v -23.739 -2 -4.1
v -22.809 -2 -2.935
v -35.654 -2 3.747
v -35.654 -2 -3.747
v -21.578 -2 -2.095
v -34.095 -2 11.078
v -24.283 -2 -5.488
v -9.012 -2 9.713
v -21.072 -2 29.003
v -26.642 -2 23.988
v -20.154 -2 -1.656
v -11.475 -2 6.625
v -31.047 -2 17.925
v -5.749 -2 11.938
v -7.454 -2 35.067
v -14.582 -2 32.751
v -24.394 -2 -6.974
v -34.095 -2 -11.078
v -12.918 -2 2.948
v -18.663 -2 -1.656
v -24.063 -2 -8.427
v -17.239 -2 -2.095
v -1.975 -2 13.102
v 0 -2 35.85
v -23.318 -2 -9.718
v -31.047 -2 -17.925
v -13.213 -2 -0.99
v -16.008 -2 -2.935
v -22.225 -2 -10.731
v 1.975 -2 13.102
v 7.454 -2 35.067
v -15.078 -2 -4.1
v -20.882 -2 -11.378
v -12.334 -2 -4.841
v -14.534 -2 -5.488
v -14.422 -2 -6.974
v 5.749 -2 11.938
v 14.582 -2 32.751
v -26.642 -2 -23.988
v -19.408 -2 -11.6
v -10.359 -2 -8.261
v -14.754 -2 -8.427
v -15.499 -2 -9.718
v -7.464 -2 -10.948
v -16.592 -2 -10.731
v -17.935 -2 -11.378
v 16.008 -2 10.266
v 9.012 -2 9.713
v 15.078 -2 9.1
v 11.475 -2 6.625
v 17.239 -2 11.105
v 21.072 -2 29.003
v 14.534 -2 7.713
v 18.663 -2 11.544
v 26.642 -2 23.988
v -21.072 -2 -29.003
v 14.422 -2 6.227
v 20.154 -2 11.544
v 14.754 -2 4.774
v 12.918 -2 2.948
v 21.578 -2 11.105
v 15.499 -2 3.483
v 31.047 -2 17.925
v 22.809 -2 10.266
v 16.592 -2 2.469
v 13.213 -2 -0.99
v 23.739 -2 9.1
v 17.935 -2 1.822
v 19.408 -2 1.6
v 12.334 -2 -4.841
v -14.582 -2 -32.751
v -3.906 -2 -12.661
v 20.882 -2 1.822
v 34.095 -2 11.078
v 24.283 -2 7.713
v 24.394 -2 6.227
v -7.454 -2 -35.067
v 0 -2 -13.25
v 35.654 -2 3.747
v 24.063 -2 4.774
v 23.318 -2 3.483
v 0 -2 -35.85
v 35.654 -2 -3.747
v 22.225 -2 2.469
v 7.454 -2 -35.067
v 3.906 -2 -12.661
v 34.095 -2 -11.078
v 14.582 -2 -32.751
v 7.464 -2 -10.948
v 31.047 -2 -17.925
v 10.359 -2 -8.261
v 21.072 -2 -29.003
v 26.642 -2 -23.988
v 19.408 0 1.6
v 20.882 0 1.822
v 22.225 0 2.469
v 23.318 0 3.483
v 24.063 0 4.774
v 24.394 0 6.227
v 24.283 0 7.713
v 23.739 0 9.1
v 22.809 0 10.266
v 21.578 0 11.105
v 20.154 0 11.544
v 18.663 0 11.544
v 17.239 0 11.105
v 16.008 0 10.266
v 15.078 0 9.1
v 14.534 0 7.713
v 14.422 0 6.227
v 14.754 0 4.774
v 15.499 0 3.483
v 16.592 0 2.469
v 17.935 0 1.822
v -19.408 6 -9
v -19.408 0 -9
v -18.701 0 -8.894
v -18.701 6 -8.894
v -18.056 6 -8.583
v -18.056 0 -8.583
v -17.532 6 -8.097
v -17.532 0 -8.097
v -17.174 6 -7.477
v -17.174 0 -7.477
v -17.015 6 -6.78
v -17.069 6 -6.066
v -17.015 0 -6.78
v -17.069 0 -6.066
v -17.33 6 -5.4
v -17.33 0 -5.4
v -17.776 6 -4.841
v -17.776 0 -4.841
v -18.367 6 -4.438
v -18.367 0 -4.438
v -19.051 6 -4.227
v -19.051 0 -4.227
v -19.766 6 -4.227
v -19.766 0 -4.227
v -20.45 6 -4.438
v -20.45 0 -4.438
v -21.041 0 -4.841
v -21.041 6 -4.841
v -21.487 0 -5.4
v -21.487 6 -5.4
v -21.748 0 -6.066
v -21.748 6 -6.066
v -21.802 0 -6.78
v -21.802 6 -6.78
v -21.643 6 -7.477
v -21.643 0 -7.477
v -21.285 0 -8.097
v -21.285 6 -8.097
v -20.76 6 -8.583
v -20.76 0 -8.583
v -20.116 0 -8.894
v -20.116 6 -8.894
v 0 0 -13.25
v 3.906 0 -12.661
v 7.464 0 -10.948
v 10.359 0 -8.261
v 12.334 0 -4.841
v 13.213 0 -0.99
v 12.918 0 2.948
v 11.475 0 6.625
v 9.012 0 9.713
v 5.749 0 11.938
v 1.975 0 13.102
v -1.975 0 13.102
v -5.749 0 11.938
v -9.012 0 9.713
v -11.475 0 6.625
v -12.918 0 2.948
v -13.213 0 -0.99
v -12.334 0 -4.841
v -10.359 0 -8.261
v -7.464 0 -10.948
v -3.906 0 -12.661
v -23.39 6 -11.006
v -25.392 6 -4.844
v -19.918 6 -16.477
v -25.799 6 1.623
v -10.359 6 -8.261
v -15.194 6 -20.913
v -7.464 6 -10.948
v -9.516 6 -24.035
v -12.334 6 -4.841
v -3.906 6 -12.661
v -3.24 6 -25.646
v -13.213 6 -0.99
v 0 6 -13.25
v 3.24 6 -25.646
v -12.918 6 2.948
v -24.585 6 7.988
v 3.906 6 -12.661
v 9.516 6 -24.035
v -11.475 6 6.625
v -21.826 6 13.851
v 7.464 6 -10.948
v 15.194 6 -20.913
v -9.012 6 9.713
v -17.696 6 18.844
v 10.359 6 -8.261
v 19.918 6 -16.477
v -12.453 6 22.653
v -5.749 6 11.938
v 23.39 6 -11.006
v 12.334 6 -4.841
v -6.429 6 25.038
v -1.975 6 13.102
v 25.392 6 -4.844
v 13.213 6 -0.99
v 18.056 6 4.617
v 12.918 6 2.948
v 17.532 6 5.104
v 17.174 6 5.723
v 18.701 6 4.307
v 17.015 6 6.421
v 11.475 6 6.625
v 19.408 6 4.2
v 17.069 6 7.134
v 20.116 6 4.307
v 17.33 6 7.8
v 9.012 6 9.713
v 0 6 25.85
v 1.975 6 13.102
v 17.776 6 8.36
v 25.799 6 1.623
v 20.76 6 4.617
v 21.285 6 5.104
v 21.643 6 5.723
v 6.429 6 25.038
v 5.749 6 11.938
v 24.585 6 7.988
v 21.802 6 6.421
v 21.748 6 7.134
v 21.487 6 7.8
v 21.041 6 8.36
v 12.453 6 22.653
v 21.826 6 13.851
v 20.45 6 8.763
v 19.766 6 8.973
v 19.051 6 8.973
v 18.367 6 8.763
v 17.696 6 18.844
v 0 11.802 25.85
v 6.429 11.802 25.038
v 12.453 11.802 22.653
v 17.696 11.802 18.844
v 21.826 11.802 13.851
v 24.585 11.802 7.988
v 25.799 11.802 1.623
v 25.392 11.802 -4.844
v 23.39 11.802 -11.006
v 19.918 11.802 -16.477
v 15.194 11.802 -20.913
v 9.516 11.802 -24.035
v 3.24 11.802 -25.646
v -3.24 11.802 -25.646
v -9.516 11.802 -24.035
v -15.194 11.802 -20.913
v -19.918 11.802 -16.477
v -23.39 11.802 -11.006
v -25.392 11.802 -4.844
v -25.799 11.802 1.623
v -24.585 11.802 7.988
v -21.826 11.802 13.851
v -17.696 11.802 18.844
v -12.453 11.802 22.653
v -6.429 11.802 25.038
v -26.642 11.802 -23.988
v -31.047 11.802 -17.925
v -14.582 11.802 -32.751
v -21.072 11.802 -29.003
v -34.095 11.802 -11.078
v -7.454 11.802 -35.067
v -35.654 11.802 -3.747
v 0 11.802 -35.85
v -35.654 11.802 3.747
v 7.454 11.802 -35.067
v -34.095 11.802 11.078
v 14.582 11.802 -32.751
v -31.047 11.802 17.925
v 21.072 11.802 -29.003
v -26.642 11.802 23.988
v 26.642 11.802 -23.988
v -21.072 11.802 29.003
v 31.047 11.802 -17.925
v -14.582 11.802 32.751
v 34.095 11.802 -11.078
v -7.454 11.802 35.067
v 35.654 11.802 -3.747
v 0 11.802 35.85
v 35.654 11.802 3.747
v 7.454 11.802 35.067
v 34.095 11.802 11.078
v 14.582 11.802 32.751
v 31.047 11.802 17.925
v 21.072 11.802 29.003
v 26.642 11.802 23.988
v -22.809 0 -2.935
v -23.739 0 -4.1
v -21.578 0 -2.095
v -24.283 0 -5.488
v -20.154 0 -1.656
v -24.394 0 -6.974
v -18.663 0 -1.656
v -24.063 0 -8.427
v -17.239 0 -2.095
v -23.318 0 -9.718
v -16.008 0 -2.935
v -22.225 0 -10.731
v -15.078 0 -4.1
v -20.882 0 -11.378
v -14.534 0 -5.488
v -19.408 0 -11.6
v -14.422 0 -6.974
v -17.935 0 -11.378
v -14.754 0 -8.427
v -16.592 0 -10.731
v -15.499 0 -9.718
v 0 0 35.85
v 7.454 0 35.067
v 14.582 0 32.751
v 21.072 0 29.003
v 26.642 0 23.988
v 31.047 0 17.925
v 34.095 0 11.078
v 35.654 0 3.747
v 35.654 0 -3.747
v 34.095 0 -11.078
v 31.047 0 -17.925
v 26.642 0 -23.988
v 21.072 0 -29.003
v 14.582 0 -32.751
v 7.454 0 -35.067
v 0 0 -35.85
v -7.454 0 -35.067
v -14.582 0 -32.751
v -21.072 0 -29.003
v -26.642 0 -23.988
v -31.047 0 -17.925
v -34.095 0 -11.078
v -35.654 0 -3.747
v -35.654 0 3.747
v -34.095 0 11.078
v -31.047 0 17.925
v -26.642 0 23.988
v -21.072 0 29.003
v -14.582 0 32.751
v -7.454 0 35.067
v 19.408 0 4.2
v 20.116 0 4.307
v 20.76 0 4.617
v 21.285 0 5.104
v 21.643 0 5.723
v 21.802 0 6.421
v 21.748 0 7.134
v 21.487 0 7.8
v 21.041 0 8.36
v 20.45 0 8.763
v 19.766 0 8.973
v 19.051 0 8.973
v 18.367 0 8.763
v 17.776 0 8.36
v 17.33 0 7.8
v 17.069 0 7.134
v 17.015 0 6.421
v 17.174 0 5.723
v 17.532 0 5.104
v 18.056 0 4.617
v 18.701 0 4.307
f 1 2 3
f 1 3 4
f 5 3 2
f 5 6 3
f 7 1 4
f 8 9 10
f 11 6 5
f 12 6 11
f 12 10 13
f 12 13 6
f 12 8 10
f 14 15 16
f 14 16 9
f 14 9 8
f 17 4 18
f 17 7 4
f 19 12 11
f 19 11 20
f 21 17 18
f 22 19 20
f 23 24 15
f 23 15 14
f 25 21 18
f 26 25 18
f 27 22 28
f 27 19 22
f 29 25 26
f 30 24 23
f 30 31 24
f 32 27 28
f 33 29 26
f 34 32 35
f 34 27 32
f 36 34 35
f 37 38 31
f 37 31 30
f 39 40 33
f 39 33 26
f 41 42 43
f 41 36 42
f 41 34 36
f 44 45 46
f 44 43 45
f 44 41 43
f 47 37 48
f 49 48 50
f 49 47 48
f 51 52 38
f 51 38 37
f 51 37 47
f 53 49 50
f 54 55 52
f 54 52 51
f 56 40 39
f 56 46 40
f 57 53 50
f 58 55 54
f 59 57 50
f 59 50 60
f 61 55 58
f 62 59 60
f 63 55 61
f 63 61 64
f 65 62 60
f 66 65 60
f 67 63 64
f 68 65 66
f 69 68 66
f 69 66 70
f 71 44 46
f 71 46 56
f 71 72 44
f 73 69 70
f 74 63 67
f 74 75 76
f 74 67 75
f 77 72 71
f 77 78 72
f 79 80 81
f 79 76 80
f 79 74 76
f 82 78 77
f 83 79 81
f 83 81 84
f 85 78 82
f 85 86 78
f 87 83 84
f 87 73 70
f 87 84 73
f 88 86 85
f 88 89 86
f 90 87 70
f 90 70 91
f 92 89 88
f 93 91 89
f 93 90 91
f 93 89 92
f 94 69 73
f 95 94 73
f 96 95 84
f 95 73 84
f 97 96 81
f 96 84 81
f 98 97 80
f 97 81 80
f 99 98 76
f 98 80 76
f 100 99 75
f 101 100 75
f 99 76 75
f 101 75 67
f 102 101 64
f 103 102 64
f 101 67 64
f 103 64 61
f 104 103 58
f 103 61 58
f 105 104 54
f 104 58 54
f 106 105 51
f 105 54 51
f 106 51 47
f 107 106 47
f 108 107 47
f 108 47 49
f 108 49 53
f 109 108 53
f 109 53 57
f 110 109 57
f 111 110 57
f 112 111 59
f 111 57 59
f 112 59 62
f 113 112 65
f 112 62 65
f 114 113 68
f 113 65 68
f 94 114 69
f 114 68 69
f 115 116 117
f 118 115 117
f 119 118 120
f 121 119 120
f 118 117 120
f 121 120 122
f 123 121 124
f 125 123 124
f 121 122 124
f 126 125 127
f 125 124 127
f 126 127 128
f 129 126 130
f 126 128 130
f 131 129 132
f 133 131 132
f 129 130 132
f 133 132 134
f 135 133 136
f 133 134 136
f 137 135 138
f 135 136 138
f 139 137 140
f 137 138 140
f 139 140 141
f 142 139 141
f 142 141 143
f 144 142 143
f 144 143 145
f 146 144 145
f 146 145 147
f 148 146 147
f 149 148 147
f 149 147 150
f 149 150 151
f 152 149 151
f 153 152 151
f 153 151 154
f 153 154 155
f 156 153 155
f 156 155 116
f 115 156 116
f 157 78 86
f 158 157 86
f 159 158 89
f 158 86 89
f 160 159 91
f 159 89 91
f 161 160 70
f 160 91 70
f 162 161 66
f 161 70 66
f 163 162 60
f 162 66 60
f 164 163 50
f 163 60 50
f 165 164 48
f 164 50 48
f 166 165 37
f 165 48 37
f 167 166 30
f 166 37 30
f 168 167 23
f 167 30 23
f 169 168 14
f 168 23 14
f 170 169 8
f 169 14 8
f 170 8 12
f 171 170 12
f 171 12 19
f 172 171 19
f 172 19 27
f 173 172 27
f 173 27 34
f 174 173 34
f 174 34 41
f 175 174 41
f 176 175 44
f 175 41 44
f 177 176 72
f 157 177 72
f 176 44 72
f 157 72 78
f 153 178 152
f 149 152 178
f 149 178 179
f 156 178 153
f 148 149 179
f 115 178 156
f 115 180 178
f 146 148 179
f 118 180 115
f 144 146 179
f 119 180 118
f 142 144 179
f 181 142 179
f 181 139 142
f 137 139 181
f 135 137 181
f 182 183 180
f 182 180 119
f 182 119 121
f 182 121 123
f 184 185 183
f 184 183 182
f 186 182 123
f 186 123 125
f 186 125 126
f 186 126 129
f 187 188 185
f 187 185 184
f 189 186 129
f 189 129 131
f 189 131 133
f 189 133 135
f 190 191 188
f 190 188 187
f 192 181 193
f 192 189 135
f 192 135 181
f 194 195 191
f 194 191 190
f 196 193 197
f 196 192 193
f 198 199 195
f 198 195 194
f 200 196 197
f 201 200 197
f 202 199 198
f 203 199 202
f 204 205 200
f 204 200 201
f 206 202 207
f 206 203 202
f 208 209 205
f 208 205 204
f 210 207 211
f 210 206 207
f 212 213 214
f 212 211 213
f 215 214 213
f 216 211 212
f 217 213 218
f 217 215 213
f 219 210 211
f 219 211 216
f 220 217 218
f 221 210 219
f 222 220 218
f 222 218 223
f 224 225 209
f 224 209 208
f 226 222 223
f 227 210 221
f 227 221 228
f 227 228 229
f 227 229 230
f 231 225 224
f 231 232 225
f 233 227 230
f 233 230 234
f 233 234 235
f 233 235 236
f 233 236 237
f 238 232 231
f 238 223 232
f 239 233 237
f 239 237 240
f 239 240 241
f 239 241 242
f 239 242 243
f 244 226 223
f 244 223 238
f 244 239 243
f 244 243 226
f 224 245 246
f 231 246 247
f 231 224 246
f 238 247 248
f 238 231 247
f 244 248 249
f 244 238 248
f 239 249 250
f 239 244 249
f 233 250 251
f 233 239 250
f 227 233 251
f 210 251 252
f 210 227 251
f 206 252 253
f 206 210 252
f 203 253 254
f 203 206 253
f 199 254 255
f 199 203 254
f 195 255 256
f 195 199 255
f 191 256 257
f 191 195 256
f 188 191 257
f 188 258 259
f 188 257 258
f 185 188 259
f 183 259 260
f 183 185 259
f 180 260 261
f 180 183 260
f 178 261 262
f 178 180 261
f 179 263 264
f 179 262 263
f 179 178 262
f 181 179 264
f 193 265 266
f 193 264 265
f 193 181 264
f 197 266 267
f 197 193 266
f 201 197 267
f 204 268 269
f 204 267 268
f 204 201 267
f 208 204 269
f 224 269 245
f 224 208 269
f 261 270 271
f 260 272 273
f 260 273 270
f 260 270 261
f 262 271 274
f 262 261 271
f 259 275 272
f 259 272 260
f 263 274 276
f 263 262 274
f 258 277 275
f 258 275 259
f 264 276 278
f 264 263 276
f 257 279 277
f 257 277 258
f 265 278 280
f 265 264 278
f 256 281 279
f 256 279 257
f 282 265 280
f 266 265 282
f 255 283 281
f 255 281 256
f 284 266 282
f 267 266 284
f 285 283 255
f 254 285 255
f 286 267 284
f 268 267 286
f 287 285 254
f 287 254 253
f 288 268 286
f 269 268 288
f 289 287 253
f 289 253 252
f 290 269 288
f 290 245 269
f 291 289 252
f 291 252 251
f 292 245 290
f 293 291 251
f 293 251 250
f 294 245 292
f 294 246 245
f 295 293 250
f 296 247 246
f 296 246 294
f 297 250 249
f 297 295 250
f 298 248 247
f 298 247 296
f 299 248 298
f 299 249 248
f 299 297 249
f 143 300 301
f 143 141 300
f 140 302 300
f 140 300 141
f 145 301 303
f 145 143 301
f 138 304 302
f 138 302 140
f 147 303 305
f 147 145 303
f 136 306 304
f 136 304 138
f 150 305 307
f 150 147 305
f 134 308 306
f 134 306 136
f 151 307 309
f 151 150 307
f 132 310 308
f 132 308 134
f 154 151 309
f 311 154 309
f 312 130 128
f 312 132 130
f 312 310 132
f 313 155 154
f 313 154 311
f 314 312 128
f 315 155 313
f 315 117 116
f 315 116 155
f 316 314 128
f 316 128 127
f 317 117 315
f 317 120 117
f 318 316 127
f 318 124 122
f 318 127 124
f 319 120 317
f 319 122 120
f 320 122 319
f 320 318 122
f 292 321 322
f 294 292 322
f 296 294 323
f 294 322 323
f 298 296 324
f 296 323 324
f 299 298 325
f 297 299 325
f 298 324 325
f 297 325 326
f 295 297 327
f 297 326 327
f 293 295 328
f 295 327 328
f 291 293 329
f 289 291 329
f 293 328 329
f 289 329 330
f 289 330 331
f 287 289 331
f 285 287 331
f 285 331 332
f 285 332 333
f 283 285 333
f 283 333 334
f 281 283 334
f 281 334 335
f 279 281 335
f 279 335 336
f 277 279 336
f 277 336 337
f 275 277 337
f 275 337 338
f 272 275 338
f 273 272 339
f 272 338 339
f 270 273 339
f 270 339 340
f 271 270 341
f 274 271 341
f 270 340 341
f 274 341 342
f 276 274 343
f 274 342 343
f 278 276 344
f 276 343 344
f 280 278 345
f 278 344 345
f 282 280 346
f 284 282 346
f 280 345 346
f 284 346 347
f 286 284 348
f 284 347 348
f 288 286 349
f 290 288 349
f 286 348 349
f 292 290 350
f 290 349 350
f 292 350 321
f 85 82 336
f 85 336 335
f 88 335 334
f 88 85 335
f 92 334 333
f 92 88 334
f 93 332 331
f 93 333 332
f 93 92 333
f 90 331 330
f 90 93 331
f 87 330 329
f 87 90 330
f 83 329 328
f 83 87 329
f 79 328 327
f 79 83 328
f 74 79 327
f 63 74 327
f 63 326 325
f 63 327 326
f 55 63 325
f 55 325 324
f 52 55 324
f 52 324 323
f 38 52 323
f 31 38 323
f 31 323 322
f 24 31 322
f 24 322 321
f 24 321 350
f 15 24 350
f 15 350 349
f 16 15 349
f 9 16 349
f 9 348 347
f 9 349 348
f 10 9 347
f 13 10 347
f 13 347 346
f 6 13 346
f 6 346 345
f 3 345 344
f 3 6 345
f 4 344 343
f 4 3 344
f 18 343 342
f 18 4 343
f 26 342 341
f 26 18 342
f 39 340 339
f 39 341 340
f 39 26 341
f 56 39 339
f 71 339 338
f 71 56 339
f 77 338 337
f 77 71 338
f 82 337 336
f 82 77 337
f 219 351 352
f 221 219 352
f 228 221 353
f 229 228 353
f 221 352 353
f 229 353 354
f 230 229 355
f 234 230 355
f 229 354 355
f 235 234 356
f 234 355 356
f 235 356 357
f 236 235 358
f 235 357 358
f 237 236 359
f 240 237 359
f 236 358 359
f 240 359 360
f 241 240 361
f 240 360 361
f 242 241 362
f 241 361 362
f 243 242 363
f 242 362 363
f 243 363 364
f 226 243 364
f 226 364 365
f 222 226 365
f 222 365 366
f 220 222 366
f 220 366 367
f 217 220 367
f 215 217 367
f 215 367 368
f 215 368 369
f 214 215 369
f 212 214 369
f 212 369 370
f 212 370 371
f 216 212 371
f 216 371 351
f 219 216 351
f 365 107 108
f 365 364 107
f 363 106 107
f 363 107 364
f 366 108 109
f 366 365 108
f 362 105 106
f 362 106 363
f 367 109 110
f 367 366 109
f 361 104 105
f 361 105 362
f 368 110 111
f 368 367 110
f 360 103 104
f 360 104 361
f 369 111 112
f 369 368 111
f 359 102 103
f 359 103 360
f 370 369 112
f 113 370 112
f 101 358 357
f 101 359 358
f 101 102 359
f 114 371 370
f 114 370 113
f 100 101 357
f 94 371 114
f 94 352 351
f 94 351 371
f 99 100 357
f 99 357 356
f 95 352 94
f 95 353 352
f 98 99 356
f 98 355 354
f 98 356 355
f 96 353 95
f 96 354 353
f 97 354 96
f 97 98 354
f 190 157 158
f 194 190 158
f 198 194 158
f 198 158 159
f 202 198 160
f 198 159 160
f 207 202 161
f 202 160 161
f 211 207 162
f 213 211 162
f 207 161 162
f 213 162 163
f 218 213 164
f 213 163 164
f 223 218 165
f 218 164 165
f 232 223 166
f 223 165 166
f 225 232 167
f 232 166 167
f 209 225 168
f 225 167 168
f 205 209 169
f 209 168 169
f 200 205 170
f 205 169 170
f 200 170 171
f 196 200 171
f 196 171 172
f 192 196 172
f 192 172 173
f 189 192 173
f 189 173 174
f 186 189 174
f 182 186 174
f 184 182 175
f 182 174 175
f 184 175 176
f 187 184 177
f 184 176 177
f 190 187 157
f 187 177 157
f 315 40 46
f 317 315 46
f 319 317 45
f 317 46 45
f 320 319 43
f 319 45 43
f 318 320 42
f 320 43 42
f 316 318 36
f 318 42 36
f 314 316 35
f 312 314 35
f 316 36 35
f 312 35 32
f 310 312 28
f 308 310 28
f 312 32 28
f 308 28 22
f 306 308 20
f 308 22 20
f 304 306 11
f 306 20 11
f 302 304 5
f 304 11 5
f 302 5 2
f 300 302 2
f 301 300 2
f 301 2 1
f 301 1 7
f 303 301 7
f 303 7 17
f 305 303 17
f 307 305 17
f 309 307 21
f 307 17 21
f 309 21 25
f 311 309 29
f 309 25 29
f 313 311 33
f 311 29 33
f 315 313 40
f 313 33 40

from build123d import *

# Parameters (mm, degrees)
SKETCH2_R           = 35.85
BOSS_EXTRUDE3_DEPTH = 11.802411407
SKETCH3_R           = 13.25
CUT_EXTRUDE1_DEPTH  = 6
SHELL1_T            = -10
CUT_EXTRUDE2_START  = -6
SKETCH4_R           = 23.25
CUT_EXTRUDE2_DEPTH  = 6
CUT_EXTRUDE3_START  = -4
SKETCH5_R           = 25.85
CUT_EXTRUDE3_DEPTH  = 4
SKETCH6_R           = 2.4
CUT_EXTRUDE4_DEPTH  = 18
BOSS_EXTRUDE4_START = 2
SKETCH7_R           = 35.85
BOSS_EXTRUDE4_DEPTH = 2
SKETCH8_R           = 5
SKETCH8_R_2         = 13.25
CUT_EXTRUDE6_DEPTH  = 2


with BuildPart() as part:
    # Sketch2 → Boss-Extrude3 (new body)
    with BuildSketch(Plane(origin=(0, 0, 0), x_dir=(1, 0, 0), z_dir=(0, 1, 0))):
        with Locations(Location((0, 0, 0), (0, 0, 270))):
            Circle(SKETCH2_R)
    extrude(amount=BOSS_EXTRUDE3_DEPTH)

    # Sketch3 → Cut-Extrude1 (cut)
    with BuildSketch(Plane.XZ):
        with Locations(Location((0, 0, 0), (0, 0, 270))):
            Circle(SKETCH3_R)
    extrude(amount=-CUT_EXTRUDE1_DEPTH, mode=Mode.SUBTRACT)

    # Shell1
    shell1_openings = [part.faces().sort_by_distance(p)[0] for p in [
        (0, 11.802411407, 0),
    ]]
    offset(amount=SHELL1_T, openings=shell1_openings, kind=Kind.INTERSECTION)

    # Sketch4 → Cut-Extrude2 (cut)
    with BuildSketch(Plane(origin=(0, 16, 0), x_dir=(1, 0, 0), z_dir=(0, 1, 0)).offset(CUT_EXTRUDE2_START)):
        Circle(SKETCH4_R)
    extrude(amount=CUT_EXTRUDE2_DEPTH, mode=Mode.SUBTRACT)

    # Sketch5 → Cut-Extrude3 (cut)
    with BuildSketch(Plane(origin=(0, 10, 0), x_dir=(1, 0, 0), z_dir=(0, 1, 0)).offset(CUT_EXTRUDE3_START)):
        with Locations(Location((0, 0, 0), (0, 0, 270))):
            Circle(SKETCH5_R)
    extrude(amount=CUT_EXTRUDE3_DEPTH, mode=Mode.SUBTRACT)

    # Sketch6 → Cut-Extrude4 (cut)
    with BuildSketch(Plane.XZ):
        with Locations(Location((-19.408408583, -6.6002785, 0), (0, 0, 270))):
            Circle(SKETCH6_R)
        with Locations(Location((19.408408583, 6.6002785, 0), (0, 0, 270))):
            Circle(SKETCH6_R)
    extrude(amount=-CUT_EXTRUDE4_DEPTH, mode=Mode.SUBTRACT)

    # Sketch7 → Boss-Extrude4 (add)
    with BuildSketch(Plane.XZ.offset(BOSS_EXTRUDE4_START)):
        with Locations(Location((0, 0, 0), (0, 0, 270))):
            Circle(SKETCH7_R)
    extrude(amount=-BOSS_EXTRUDE4_DEPTH)

    # Sketch8 → Cut-Extrude6 (cut)
    with BuildSketch(Plane.XZ.offset(2)):
        with Locations(Location((-19.408408583, -6.6002785, 0), (0, 0, 270))):
            Circle(SKETCH8_R)
        with Locations(Location((19.408408583, 6.6002785, 0), (0, 0, 270))):
            Circle(SKETCH8_R)
        with Locations(Location((0, 0, 0), (0, 0, 270))):
            Circle(SKETCH8_R_2)
    extrude(amount=-CUT_EXTRUDE6_DEPTH, mode=Mode.SUBTRACT)


solid = part.part
